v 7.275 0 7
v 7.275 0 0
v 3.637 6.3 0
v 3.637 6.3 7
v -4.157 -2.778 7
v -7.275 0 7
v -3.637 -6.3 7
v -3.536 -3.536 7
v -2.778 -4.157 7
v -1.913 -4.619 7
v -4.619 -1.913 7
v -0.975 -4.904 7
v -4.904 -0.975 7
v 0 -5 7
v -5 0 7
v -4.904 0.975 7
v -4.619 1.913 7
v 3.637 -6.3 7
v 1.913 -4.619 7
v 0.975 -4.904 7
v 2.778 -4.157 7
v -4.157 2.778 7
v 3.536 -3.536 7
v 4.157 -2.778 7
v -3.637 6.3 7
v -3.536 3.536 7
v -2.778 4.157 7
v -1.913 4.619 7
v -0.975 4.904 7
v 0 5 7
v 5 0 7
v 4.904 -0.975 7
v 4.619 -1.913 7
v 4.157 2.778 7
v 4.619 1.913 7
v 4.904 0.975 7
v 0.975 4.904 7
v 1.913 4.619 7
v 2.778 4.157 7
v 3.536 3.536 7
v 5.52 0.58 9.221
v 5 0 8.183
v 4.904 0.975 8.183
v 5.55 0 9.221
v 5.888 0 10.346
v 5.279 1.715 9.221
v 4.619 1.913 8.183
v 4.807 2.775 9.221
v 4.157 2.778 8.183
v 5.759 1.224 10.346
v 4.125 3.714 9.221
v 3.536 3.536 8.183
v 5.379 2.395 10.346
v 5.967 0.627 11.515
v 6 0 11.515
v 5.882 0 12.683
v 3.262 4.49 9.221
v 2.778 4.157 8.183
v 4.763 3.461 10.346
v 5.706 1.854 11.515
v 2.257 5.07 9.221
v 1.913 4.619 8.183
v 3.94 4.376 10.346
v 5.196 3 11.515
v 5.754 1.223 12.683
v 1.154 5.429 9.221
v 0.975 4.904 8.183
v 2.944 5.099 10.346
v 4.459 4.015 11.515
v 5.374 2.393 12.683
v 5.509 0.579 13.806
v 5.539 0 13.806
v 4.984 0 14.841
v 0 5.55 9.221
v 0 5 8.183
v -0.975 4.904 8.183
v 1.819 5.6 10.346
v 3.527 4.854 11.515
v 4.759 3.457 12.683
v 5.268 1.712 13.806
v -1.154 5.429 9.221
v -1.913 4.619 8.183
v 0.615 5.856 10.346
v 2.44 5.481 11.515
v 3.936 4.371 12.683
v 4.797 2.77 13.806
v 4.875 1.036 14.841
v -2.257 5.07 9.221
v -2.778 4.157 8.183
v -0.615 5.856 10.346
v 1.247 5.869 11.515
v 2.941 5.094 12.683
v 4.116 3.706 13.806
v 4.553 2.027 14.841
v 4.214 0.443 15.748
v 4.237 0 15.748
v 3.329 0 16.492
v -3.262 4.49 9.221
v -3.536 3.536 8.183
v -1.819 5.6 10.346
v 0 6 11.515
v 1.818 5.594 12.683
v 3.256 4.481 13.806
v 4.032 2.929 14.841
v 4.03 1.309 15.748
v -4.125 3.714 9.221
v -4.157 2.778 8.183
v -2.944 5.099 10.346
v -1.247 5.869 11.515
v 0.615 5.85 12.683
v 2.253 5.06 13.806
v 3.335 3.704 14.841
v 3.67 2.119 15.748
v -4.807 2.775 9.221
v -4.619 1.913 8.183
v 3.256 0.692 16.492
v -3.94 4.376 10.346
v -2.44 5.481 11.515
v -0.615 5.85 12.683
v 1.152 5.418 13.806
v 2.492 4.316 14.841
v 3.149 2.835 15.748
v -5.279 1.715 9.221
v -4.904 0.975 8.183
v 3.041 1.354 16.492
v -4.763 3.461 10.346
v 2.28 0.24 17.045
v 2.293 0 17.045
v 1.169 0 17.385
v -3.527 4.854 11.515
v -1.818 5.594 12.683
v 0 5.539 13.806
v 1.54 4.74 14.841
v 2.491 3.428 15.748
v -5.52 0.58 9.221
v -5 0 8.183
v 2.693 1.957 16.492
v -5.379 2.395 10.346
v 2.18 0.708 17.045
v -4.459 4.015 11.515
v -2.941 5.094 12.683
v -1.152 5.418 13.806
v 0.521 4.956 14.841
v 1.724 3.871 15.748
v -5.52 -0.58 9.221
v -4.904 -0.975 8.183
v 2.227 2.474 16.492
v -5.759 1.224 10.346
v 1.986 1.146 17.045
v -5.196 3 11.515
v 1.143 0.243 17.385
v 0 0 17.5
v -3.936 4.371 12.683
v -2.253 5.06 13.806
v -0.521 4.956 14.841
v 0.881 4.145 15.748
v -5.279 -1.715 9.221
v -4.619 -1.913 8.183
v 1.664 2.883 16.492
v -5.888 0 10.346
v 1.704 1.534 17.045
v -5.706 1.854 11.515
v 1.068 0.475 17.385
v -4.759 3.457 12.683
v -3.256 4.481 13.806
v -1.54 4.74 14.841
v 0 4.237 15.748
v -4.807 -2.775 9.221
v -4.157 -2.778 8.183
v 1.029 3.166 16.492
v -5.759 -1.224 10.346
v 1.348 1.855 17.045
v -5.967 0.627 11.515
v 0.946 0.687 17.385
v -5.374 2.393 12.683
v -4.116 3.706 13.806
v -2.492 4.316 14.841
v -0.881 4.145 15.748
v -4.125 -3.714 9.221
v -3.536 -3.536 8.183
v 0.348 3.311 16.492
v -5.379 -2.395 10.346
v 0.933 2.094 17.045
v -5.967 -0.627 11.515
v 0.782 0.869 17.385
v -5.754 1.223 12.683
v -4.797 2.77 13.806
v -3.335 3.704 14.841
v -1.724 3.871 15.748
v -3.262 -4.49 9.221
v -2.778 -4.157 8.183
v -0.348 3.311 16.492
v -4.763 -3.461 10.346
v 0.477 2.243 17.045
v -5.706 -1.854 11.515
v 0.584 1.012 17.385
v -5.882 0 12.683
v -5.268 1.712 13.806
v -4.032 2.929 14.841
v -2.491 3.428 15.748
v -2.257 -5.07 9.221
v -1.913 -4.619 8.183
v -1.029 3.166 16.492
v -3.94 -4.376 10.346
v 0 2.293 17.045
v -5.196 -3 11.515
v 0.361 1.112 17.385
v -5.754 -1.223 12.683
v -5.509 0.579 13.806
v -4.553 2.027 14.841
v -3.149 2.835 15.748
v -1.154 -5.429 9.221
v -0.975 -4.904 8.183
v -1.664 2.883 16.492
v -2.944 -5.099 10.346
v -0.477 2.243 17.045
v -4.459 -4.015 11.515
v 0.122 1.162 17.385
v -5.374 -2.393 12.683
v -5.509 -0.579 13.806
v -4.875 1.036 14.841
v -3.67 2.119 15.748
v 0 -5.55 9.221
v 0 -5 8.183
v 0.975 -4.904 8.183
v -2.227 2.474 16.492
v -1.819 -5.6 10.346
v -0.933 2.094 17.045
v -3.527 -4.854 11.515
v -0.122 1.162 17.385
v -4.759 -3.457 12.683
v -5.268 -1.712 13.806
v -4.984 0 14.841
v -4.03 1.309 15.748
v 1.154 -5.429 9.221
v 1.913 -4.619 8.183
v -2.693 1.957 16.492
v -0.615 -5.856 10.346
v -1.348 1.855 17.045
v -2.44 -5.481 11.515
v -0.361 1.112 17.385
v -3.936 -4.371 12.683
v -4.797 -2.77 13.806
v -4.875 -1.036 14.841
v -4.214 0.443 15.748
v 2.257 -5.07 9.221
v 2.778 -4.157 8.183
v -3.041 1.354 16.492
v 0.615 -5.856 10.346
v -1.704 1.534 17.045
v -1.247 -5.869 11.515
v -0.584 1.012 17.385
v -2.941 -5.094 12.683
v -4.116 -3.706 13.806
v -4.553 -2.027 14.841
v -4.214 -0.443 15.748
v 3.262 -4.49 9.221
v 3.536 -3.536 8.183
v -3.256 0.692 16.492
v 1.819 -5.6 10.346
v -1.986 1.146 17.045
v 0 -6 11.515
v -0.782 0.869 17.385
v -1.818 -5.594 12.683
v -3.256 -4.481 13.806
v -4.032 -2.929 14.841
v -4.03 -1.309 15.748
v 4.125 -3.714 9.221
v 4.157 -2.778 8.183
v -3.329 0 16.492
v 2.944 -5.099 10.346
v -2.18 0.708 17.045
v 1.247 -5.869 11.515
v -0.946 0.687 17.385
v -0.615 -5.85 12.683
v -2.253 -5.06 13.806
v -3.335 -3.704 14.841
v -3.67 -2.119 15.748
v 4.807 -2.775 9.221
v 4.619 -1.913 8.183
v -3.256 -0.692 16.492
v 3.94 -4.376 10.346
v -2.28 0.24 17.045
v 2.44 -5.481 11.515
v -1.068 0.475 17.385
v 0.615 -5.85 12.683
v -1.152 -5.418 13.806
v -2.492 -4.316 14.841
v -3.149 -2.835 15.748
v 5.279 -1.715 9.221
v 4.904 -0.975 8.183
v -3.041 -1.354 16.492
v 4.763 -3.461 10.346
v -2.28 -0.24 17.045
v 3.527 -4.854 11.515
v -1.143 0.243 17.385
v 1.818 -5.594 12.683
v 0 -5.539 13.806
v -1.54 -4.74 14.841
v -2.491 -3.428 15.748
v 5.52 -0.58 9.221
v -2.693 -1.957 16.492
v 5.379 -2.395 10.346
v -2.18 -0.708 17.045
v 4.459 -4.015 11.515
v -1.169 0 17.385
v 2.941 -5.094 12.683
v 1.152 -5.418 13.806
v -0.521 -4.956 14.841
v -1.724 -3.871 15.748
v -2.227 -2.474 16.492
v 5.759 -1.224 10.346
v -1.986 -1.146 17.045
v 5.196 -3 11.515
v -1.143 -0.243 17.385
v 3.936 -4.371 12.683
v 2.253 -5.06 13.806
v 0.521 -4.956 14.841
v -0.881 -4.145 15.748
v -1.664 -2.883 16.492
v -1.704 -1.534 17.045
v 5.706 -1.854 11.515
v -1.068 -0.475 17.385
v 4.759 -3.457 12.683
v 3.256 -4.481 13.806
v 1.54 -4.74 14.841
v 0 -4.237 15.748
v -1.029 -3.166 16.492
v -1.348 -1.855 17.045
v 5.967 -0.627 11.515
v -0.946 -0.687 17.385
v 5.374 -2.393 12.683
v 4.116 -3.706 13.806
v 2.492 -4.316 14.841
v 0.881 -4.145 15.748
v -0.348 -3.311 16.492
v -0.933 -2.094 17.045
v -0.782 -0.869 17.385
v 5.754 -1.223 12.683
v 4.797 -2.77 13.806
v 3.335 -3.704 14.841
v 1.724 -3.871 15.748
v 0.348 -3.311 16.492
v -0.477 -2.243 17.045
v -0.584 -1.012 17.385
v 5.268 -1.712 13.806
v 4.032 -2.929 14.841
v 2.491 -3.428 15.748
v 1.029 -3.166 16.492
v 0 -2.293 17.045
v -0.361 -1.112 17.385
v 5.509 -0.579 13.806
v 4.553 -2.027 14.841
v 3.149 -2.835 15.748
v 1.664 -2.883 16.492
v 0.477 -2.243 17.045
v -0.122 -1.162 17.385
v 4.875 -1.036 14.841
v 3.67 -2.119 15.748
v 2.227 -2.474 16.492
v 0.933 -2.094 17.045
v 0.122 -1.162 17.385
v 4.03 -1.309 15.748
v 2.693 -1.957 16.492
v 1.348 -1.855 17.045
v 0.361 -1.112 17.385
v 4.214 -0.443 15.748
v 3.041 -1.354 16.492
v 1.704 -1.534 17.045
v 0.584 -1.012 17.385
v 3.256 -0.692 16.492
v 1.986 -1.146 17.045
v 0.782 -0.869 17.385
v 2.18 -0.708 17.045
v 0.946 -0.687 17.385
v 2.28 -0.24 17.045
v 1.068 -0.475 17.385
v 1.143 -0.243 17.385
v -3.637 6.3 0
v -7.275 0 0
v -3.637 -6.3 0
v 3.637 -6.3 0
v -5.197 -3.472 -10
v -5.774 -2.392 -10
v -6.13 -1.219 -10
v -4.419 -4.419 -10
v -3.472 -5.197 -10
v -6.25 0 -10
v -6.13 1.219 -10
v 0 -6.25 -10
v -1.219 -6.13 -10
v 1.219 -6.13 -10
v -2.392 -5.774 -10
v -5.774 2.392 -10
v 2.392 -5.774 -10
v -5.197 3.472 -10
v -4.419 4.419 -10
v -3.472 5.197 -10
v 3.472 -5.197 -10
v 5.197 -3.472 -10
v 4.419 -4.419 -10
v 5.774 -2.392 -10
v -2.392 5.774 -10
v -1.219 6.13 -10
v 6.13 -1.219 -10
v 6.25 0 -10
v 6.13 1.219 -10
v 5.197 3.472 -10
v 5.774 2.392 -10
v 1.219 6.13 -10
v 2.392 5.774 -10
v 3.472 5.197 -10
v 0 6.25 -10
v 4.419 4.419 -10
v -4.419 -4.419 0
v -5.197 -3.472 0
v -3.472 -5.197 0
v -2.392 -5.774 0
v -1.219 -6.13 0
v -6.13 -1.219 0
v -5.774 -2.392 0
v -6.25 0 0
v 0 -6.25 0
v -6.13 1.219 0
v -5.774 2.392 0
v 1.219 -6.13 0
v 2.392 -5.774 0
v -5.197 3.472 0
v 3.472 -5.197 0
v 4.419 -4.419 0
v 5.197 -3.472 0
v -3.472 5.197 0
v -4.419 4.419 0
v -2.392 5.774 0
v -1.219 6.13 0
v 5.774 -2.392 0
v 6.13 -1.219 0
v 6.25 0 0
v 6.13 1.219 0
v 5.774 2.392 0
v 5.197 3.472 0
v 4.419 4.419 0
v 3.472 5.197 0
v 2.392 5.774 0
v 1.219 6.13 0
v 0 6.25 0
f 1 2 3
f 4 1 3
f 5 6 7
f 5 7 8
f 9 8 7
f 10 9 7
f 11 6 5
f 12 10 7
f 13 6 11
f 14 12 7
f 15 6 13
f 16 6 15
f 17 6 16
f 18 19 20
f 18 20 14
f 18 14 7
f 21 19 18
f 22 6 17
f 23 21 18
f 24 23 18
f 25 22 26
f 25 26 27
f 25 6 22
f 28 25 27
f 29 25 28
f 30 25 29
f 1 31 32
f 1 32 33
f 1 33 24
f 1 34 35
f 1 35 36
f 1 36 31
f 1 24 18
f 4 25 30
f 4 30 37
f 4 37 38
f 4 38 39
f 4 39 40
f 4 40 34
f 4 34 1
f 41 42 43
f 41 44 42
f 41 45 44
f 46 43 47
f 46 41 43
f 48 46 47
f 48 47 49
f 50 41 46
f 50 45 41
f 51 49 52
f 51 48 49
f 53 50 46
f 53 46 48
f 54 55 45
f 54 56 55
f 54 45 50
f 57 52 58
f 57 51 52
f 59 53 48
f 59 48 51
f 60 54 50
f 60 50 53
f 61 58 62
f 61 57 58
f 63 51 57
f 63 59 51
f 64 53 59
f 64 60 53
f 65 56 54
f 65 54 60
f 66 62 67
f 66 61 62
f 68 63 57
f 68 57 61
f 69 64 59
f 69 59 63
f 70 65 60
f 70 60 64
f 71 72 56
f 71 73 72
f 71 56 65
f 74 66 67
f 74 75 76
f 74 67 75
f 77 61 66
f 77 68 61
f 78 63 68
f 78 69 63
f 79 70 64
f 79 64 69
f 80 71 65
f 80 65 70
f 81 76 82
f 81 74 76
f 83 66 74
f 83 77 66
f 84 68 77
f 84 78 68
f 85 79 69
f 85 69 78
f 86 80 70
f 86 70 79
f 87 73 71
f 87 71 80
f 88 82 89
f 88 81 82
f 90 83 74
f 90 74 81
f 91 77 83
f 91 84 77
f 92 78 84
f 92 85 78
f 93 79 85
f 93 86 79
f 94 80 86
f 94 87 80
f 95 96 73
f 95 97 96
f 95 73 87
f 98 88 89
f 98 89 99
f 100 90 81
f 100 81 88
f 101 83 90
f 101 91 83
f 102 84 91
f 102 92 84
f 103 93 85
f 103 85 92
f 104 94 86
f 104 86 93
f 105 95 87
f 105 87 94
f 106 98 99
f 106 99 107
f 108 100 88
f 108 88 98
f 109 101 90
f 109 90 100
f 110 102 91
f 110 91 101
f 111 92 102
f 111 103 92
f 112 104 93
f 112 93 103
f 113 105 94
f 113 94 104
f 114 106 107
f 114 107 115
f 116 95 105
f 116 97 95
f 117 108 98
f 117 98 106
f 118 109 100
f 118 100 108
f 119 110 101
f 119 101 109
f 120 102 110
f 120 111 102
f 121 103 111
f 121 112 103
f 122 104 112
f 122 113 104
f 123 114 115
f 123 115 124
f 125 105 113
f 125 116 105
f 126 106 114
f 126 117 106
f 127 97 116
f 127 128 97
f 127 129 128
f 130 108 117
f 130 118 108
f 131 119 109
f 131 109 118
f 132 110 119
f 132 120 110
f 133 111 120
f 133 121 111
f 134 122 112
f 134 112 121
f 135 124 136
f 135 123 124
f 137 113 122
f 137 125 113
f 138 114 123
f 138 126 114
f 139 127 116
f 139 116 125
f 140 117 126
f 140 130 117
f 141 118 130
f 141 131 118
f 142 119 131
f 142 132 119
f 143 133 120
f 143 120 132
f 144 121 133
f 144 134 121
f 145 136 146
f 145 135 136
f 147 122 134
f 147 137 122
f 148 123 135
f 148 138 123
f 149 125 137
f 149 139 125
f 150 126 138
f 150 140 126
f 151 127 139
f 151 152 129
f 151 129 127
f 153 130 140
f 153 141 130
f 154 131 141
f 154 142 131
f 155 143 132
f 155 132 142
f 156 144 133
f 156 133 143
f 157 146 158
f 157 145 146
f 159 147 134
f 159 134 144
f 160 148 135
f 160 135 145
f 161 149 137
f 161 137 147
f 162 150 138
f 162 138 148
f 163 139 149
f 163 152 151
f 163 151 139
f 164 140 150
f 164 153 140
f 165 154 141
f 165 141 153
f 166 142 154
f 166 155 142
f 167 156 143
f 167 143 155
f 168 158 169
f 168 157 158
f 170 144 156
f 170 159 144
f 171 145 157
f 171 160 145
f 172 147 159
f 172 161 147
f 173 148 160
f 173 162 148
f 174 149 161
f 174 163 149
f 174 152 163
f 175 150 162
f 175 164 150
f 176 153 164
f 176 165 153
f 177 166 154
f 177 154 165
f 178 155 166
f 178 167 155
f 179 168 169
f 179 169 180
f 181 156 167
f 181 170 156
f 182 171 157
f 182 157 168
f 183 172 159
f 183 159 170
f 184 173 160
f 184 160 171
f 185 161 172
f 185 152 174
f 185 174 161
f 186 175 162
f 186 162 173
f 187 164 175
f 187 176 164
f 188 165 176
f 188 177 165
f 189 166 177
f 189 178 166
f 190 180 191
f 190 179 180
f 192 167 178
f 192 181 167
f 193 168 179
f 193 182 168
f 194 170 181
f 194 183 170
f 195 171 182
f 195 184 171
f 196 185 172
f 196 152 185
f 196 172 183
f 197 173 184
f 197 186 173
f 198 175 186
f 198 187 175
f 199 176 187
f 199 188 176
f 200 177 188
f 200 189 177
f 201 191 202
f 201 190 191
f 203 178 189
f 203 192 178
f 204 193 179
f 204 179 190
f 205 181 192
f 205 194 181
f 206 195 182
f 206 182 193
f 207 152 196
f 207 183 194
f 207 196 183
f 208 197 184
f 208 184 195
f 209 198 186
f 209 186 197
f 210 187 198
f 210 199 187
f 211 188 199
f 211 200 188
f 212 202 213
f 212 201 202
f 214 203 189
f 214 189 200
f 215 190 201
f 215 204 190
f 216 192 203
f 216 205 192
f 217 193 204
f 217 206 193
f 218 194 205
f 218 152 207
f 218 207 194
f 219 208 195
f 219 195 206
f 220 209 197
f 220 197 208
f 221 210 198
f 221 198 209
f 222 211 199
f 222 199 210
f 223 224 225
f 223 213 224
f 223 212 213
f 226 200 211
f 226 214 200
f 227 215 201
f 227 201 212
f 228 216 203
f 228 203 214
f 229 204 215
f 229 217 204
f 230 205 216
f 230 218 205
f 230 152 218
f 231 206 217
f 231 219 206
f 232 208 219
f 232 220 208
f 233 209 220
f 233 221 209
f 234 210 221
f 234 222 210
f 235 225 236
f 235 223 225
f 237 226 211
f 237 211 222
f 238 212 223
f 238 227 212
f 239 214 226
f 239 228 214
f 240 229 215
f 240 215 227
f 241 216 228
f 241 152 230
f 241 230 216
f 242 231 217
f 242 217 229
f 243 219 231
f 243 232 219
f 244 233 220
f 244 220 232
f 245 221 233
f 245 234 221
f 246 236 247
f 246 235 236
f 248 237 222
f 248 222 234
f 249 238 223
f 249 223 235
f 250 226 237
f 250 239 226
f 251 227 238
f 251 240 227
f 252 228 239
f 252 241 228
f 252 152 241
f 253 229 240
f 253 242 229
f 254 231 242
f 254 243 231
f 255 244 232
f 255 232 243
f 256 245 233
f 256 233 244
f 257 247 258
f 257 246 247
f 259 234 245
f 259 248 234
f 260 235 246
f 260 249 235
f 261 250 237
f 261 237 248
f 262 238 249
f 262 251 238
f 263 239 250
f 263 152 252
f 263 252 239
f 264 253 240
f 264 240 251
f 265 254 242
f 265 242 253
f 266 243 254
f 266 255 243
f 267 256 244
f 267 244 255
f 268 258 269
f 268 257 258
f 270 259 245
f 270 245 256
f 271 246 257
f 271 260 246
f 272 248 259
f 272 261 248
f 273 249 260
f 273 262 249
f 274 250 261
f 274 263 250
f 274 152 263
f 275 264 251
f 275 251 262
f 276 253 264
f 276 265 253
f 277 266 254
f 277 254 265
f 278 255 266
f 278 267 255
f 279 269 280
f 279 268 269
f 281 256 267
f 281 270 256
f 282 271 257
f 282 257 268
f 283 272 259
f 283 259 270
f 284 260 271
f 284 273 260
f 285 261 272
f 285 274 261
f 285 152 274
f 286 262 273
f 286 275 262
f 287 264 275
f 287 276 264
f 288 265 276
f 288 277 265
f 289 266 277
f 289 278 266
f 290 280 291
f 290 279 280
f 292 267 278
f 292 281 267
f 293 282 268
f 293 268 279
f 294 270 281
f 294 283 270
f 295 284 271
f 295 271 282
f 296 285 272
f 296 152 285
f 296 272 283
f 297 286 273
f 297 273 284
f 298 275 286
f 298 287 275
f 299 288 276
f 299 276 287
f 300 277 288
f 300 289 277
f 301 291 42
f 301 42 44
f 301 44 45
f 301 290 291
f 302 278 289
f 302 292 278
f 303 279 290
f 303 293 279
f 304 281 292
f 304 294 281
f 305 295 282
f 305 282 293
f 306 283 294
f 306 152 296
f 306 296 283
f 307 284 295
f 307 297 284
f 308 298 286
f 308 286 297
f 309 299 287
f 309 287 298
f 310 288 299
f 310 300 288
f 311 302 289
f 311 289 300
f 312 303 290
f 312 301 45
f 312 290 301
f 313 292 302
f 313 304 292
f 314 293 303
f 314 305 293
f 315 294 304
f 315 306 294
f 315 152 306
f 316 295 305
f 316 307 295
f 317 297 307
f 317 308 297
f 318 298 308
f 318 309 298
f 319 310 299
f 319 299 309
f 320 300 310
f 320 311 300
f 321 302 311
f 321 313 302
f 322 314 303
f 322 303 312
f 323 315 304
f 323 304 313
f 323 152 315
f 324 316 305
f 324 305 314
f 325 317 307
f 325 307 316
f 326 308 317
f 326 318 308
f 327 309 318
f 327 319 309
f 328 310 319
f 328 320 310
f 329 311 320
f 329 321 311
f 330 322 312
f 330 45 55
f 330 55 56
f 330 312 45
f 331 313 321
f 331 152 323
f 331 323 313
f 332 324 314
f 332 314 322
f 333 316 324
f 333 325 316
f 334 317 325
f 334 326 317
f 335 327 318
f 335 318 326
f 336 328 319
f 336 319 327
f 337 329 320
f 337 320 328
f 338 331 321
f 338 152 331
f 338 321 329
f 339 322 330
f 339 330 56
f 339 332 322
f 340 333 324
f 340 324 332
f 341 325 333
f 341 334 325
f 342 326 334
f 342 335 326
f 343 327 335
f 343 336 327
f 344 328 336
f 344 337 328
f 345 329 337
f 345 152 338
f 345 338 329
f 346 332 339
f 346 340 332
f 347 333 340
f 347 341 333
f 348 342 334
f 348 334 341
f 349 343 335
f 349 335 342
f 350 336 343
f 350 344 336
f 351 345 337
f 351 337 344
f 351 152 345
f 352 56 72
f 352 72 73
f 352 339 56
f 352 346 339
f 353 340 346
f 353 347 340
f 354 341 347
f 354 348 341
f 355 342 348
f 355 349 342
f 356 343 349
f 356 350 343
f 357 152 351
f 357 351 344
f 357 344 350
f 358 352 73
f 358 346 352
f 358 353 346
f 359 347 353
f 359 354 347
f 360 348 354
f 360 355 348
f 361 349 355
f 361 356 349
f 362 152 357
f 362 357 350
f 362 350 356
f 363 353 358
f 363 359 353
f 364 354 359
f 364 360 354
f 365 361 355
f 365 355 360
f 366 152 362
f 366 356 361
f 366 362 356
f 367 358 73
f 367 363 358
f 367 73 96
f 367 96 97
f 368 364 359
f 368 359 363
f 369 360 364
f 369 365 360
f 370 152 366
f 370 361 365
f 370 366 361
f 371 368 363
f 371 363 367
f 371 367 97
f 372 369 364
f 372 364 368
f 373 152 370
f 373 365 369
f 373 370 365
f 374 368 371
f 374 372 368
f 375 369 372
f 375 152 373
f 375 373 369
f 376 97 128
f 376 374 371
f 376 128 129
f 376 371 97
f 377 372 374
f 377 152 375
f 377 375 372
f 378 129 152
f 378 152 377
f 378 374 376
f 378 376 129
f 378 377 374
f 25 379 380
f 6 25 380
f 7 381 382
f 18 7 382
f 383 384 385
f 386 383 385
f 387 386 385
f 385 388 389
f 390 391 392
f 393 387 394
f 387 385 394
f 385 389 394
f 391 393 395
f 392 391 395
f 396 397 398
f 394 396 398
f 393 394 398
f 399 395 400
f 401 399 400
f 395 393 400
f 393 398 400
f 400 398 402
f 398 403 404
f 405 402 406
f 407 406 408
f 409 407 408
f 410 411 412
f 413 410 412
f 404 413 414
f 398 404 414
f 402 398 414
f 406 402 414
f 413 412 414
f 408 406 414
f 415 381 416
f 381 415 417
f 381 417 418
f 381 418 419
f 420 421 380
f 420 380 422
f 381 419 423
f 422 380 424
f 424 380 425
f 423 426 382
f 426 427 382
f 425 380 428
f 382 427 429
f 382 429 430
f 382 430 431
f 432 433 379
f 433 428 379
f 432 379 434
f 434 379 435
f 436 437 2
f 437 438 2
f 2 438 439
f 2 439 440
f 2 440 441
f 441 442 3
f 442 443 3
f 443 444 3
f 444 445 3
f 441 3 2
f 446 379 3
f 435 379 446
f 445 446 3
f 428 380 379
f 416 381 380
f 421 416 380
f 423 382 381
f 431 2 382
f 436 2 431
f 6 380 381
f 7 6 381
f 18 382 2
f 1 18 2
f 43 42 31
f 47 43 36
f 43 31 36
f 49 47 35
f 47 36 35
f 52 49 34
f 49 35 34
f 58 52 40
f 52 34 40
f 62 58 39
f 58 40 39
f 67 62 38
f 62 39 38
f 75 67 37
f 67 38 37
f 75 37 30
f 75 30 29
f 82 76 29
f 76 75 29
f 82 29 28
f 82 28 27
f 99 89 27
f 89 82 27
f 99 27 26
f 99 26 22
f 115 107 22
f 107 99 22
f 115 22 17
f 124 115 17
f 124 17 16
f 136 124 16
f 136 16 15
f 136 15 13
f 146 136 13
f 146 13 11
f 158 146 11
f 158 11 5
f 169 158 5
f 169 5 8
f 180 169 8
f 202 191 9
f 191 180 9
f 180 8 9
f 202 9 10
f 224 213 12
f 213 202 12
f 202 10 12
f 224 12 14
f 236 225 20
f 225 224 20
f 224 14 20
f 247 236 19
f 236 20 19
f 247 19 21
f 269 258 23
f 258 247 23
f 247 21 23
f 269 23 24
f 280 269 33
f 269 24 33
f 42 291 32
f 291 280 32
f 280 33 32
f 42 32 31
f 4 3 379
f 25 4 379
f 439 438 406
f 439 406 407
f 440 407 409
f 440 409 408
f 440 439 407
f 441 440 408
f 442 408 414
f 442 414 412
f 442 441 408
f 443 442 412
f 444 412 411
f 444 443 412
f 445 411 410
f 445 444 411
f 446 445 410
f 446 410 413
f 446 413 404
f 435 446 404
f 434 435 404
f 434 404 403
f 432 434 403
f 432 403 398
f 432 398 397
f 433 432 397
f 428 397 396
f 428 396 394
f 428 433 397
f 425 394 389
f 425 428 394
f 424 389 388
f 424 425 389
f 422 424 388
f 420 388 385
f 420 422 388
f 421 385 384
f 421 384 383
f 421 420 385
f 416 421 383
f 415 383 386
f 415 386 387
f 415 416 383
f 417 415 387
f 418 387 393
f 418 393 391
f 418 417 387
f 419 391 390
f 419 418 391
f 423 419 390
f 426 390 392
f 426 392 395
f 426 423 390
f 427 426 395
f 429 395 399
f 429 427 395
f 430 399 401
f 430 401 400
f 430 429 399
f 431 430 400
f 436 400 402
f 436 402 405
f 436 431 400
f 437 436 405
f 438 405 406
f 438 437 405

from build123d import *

# Parameters (mm, degrees)
SKETCH_R     = 6.25
PAD_DEPTH    = 10
PAD001_DEPTH = 7
SKETCH002_R  = 5
PAD002_DEPTH = 8.5


with BuildPart() as part:
    # Sketch → Pad (new body)
    with BuildSketch(Plane.XY):
        Circle(SKETCH_R)
    extrude(amount=-PAD_DEPTH)

    # Sketch001 → Pad001 (join)
    with BuildSketch(Plane.XY):
        Polygon((7.274613, 0), (3.637307, 6.3), (-3.637307, 6.3), (-7.274613, 0), (-3.637307, -6.3), (3.637307, -6.3), align=None)
    extrude(amount=PAD001_DEPTH)

    # Sketch002 → Pad002 (join)
    with BuildSketch(Plane.XY):
        Circle(SKETCH002_R)
    extrude(amount=PAD002_DEPTH)

    # Sphere → Sphere (revolve)
    with BuildSketch(Plane(origin=(0, 0, 11.5), x_dir=(1, 0, 0), z_dir=(0, -1, 0))):
        with BuildLine():
            ThreePointArc((0, -6), (6, 0), (0, 6))
            Line((0, 6), (0, -6))
        make_face()
    revolve(axis=Axis((0, 0, 11.5), (0, 0, 1)))


solid = part.part
